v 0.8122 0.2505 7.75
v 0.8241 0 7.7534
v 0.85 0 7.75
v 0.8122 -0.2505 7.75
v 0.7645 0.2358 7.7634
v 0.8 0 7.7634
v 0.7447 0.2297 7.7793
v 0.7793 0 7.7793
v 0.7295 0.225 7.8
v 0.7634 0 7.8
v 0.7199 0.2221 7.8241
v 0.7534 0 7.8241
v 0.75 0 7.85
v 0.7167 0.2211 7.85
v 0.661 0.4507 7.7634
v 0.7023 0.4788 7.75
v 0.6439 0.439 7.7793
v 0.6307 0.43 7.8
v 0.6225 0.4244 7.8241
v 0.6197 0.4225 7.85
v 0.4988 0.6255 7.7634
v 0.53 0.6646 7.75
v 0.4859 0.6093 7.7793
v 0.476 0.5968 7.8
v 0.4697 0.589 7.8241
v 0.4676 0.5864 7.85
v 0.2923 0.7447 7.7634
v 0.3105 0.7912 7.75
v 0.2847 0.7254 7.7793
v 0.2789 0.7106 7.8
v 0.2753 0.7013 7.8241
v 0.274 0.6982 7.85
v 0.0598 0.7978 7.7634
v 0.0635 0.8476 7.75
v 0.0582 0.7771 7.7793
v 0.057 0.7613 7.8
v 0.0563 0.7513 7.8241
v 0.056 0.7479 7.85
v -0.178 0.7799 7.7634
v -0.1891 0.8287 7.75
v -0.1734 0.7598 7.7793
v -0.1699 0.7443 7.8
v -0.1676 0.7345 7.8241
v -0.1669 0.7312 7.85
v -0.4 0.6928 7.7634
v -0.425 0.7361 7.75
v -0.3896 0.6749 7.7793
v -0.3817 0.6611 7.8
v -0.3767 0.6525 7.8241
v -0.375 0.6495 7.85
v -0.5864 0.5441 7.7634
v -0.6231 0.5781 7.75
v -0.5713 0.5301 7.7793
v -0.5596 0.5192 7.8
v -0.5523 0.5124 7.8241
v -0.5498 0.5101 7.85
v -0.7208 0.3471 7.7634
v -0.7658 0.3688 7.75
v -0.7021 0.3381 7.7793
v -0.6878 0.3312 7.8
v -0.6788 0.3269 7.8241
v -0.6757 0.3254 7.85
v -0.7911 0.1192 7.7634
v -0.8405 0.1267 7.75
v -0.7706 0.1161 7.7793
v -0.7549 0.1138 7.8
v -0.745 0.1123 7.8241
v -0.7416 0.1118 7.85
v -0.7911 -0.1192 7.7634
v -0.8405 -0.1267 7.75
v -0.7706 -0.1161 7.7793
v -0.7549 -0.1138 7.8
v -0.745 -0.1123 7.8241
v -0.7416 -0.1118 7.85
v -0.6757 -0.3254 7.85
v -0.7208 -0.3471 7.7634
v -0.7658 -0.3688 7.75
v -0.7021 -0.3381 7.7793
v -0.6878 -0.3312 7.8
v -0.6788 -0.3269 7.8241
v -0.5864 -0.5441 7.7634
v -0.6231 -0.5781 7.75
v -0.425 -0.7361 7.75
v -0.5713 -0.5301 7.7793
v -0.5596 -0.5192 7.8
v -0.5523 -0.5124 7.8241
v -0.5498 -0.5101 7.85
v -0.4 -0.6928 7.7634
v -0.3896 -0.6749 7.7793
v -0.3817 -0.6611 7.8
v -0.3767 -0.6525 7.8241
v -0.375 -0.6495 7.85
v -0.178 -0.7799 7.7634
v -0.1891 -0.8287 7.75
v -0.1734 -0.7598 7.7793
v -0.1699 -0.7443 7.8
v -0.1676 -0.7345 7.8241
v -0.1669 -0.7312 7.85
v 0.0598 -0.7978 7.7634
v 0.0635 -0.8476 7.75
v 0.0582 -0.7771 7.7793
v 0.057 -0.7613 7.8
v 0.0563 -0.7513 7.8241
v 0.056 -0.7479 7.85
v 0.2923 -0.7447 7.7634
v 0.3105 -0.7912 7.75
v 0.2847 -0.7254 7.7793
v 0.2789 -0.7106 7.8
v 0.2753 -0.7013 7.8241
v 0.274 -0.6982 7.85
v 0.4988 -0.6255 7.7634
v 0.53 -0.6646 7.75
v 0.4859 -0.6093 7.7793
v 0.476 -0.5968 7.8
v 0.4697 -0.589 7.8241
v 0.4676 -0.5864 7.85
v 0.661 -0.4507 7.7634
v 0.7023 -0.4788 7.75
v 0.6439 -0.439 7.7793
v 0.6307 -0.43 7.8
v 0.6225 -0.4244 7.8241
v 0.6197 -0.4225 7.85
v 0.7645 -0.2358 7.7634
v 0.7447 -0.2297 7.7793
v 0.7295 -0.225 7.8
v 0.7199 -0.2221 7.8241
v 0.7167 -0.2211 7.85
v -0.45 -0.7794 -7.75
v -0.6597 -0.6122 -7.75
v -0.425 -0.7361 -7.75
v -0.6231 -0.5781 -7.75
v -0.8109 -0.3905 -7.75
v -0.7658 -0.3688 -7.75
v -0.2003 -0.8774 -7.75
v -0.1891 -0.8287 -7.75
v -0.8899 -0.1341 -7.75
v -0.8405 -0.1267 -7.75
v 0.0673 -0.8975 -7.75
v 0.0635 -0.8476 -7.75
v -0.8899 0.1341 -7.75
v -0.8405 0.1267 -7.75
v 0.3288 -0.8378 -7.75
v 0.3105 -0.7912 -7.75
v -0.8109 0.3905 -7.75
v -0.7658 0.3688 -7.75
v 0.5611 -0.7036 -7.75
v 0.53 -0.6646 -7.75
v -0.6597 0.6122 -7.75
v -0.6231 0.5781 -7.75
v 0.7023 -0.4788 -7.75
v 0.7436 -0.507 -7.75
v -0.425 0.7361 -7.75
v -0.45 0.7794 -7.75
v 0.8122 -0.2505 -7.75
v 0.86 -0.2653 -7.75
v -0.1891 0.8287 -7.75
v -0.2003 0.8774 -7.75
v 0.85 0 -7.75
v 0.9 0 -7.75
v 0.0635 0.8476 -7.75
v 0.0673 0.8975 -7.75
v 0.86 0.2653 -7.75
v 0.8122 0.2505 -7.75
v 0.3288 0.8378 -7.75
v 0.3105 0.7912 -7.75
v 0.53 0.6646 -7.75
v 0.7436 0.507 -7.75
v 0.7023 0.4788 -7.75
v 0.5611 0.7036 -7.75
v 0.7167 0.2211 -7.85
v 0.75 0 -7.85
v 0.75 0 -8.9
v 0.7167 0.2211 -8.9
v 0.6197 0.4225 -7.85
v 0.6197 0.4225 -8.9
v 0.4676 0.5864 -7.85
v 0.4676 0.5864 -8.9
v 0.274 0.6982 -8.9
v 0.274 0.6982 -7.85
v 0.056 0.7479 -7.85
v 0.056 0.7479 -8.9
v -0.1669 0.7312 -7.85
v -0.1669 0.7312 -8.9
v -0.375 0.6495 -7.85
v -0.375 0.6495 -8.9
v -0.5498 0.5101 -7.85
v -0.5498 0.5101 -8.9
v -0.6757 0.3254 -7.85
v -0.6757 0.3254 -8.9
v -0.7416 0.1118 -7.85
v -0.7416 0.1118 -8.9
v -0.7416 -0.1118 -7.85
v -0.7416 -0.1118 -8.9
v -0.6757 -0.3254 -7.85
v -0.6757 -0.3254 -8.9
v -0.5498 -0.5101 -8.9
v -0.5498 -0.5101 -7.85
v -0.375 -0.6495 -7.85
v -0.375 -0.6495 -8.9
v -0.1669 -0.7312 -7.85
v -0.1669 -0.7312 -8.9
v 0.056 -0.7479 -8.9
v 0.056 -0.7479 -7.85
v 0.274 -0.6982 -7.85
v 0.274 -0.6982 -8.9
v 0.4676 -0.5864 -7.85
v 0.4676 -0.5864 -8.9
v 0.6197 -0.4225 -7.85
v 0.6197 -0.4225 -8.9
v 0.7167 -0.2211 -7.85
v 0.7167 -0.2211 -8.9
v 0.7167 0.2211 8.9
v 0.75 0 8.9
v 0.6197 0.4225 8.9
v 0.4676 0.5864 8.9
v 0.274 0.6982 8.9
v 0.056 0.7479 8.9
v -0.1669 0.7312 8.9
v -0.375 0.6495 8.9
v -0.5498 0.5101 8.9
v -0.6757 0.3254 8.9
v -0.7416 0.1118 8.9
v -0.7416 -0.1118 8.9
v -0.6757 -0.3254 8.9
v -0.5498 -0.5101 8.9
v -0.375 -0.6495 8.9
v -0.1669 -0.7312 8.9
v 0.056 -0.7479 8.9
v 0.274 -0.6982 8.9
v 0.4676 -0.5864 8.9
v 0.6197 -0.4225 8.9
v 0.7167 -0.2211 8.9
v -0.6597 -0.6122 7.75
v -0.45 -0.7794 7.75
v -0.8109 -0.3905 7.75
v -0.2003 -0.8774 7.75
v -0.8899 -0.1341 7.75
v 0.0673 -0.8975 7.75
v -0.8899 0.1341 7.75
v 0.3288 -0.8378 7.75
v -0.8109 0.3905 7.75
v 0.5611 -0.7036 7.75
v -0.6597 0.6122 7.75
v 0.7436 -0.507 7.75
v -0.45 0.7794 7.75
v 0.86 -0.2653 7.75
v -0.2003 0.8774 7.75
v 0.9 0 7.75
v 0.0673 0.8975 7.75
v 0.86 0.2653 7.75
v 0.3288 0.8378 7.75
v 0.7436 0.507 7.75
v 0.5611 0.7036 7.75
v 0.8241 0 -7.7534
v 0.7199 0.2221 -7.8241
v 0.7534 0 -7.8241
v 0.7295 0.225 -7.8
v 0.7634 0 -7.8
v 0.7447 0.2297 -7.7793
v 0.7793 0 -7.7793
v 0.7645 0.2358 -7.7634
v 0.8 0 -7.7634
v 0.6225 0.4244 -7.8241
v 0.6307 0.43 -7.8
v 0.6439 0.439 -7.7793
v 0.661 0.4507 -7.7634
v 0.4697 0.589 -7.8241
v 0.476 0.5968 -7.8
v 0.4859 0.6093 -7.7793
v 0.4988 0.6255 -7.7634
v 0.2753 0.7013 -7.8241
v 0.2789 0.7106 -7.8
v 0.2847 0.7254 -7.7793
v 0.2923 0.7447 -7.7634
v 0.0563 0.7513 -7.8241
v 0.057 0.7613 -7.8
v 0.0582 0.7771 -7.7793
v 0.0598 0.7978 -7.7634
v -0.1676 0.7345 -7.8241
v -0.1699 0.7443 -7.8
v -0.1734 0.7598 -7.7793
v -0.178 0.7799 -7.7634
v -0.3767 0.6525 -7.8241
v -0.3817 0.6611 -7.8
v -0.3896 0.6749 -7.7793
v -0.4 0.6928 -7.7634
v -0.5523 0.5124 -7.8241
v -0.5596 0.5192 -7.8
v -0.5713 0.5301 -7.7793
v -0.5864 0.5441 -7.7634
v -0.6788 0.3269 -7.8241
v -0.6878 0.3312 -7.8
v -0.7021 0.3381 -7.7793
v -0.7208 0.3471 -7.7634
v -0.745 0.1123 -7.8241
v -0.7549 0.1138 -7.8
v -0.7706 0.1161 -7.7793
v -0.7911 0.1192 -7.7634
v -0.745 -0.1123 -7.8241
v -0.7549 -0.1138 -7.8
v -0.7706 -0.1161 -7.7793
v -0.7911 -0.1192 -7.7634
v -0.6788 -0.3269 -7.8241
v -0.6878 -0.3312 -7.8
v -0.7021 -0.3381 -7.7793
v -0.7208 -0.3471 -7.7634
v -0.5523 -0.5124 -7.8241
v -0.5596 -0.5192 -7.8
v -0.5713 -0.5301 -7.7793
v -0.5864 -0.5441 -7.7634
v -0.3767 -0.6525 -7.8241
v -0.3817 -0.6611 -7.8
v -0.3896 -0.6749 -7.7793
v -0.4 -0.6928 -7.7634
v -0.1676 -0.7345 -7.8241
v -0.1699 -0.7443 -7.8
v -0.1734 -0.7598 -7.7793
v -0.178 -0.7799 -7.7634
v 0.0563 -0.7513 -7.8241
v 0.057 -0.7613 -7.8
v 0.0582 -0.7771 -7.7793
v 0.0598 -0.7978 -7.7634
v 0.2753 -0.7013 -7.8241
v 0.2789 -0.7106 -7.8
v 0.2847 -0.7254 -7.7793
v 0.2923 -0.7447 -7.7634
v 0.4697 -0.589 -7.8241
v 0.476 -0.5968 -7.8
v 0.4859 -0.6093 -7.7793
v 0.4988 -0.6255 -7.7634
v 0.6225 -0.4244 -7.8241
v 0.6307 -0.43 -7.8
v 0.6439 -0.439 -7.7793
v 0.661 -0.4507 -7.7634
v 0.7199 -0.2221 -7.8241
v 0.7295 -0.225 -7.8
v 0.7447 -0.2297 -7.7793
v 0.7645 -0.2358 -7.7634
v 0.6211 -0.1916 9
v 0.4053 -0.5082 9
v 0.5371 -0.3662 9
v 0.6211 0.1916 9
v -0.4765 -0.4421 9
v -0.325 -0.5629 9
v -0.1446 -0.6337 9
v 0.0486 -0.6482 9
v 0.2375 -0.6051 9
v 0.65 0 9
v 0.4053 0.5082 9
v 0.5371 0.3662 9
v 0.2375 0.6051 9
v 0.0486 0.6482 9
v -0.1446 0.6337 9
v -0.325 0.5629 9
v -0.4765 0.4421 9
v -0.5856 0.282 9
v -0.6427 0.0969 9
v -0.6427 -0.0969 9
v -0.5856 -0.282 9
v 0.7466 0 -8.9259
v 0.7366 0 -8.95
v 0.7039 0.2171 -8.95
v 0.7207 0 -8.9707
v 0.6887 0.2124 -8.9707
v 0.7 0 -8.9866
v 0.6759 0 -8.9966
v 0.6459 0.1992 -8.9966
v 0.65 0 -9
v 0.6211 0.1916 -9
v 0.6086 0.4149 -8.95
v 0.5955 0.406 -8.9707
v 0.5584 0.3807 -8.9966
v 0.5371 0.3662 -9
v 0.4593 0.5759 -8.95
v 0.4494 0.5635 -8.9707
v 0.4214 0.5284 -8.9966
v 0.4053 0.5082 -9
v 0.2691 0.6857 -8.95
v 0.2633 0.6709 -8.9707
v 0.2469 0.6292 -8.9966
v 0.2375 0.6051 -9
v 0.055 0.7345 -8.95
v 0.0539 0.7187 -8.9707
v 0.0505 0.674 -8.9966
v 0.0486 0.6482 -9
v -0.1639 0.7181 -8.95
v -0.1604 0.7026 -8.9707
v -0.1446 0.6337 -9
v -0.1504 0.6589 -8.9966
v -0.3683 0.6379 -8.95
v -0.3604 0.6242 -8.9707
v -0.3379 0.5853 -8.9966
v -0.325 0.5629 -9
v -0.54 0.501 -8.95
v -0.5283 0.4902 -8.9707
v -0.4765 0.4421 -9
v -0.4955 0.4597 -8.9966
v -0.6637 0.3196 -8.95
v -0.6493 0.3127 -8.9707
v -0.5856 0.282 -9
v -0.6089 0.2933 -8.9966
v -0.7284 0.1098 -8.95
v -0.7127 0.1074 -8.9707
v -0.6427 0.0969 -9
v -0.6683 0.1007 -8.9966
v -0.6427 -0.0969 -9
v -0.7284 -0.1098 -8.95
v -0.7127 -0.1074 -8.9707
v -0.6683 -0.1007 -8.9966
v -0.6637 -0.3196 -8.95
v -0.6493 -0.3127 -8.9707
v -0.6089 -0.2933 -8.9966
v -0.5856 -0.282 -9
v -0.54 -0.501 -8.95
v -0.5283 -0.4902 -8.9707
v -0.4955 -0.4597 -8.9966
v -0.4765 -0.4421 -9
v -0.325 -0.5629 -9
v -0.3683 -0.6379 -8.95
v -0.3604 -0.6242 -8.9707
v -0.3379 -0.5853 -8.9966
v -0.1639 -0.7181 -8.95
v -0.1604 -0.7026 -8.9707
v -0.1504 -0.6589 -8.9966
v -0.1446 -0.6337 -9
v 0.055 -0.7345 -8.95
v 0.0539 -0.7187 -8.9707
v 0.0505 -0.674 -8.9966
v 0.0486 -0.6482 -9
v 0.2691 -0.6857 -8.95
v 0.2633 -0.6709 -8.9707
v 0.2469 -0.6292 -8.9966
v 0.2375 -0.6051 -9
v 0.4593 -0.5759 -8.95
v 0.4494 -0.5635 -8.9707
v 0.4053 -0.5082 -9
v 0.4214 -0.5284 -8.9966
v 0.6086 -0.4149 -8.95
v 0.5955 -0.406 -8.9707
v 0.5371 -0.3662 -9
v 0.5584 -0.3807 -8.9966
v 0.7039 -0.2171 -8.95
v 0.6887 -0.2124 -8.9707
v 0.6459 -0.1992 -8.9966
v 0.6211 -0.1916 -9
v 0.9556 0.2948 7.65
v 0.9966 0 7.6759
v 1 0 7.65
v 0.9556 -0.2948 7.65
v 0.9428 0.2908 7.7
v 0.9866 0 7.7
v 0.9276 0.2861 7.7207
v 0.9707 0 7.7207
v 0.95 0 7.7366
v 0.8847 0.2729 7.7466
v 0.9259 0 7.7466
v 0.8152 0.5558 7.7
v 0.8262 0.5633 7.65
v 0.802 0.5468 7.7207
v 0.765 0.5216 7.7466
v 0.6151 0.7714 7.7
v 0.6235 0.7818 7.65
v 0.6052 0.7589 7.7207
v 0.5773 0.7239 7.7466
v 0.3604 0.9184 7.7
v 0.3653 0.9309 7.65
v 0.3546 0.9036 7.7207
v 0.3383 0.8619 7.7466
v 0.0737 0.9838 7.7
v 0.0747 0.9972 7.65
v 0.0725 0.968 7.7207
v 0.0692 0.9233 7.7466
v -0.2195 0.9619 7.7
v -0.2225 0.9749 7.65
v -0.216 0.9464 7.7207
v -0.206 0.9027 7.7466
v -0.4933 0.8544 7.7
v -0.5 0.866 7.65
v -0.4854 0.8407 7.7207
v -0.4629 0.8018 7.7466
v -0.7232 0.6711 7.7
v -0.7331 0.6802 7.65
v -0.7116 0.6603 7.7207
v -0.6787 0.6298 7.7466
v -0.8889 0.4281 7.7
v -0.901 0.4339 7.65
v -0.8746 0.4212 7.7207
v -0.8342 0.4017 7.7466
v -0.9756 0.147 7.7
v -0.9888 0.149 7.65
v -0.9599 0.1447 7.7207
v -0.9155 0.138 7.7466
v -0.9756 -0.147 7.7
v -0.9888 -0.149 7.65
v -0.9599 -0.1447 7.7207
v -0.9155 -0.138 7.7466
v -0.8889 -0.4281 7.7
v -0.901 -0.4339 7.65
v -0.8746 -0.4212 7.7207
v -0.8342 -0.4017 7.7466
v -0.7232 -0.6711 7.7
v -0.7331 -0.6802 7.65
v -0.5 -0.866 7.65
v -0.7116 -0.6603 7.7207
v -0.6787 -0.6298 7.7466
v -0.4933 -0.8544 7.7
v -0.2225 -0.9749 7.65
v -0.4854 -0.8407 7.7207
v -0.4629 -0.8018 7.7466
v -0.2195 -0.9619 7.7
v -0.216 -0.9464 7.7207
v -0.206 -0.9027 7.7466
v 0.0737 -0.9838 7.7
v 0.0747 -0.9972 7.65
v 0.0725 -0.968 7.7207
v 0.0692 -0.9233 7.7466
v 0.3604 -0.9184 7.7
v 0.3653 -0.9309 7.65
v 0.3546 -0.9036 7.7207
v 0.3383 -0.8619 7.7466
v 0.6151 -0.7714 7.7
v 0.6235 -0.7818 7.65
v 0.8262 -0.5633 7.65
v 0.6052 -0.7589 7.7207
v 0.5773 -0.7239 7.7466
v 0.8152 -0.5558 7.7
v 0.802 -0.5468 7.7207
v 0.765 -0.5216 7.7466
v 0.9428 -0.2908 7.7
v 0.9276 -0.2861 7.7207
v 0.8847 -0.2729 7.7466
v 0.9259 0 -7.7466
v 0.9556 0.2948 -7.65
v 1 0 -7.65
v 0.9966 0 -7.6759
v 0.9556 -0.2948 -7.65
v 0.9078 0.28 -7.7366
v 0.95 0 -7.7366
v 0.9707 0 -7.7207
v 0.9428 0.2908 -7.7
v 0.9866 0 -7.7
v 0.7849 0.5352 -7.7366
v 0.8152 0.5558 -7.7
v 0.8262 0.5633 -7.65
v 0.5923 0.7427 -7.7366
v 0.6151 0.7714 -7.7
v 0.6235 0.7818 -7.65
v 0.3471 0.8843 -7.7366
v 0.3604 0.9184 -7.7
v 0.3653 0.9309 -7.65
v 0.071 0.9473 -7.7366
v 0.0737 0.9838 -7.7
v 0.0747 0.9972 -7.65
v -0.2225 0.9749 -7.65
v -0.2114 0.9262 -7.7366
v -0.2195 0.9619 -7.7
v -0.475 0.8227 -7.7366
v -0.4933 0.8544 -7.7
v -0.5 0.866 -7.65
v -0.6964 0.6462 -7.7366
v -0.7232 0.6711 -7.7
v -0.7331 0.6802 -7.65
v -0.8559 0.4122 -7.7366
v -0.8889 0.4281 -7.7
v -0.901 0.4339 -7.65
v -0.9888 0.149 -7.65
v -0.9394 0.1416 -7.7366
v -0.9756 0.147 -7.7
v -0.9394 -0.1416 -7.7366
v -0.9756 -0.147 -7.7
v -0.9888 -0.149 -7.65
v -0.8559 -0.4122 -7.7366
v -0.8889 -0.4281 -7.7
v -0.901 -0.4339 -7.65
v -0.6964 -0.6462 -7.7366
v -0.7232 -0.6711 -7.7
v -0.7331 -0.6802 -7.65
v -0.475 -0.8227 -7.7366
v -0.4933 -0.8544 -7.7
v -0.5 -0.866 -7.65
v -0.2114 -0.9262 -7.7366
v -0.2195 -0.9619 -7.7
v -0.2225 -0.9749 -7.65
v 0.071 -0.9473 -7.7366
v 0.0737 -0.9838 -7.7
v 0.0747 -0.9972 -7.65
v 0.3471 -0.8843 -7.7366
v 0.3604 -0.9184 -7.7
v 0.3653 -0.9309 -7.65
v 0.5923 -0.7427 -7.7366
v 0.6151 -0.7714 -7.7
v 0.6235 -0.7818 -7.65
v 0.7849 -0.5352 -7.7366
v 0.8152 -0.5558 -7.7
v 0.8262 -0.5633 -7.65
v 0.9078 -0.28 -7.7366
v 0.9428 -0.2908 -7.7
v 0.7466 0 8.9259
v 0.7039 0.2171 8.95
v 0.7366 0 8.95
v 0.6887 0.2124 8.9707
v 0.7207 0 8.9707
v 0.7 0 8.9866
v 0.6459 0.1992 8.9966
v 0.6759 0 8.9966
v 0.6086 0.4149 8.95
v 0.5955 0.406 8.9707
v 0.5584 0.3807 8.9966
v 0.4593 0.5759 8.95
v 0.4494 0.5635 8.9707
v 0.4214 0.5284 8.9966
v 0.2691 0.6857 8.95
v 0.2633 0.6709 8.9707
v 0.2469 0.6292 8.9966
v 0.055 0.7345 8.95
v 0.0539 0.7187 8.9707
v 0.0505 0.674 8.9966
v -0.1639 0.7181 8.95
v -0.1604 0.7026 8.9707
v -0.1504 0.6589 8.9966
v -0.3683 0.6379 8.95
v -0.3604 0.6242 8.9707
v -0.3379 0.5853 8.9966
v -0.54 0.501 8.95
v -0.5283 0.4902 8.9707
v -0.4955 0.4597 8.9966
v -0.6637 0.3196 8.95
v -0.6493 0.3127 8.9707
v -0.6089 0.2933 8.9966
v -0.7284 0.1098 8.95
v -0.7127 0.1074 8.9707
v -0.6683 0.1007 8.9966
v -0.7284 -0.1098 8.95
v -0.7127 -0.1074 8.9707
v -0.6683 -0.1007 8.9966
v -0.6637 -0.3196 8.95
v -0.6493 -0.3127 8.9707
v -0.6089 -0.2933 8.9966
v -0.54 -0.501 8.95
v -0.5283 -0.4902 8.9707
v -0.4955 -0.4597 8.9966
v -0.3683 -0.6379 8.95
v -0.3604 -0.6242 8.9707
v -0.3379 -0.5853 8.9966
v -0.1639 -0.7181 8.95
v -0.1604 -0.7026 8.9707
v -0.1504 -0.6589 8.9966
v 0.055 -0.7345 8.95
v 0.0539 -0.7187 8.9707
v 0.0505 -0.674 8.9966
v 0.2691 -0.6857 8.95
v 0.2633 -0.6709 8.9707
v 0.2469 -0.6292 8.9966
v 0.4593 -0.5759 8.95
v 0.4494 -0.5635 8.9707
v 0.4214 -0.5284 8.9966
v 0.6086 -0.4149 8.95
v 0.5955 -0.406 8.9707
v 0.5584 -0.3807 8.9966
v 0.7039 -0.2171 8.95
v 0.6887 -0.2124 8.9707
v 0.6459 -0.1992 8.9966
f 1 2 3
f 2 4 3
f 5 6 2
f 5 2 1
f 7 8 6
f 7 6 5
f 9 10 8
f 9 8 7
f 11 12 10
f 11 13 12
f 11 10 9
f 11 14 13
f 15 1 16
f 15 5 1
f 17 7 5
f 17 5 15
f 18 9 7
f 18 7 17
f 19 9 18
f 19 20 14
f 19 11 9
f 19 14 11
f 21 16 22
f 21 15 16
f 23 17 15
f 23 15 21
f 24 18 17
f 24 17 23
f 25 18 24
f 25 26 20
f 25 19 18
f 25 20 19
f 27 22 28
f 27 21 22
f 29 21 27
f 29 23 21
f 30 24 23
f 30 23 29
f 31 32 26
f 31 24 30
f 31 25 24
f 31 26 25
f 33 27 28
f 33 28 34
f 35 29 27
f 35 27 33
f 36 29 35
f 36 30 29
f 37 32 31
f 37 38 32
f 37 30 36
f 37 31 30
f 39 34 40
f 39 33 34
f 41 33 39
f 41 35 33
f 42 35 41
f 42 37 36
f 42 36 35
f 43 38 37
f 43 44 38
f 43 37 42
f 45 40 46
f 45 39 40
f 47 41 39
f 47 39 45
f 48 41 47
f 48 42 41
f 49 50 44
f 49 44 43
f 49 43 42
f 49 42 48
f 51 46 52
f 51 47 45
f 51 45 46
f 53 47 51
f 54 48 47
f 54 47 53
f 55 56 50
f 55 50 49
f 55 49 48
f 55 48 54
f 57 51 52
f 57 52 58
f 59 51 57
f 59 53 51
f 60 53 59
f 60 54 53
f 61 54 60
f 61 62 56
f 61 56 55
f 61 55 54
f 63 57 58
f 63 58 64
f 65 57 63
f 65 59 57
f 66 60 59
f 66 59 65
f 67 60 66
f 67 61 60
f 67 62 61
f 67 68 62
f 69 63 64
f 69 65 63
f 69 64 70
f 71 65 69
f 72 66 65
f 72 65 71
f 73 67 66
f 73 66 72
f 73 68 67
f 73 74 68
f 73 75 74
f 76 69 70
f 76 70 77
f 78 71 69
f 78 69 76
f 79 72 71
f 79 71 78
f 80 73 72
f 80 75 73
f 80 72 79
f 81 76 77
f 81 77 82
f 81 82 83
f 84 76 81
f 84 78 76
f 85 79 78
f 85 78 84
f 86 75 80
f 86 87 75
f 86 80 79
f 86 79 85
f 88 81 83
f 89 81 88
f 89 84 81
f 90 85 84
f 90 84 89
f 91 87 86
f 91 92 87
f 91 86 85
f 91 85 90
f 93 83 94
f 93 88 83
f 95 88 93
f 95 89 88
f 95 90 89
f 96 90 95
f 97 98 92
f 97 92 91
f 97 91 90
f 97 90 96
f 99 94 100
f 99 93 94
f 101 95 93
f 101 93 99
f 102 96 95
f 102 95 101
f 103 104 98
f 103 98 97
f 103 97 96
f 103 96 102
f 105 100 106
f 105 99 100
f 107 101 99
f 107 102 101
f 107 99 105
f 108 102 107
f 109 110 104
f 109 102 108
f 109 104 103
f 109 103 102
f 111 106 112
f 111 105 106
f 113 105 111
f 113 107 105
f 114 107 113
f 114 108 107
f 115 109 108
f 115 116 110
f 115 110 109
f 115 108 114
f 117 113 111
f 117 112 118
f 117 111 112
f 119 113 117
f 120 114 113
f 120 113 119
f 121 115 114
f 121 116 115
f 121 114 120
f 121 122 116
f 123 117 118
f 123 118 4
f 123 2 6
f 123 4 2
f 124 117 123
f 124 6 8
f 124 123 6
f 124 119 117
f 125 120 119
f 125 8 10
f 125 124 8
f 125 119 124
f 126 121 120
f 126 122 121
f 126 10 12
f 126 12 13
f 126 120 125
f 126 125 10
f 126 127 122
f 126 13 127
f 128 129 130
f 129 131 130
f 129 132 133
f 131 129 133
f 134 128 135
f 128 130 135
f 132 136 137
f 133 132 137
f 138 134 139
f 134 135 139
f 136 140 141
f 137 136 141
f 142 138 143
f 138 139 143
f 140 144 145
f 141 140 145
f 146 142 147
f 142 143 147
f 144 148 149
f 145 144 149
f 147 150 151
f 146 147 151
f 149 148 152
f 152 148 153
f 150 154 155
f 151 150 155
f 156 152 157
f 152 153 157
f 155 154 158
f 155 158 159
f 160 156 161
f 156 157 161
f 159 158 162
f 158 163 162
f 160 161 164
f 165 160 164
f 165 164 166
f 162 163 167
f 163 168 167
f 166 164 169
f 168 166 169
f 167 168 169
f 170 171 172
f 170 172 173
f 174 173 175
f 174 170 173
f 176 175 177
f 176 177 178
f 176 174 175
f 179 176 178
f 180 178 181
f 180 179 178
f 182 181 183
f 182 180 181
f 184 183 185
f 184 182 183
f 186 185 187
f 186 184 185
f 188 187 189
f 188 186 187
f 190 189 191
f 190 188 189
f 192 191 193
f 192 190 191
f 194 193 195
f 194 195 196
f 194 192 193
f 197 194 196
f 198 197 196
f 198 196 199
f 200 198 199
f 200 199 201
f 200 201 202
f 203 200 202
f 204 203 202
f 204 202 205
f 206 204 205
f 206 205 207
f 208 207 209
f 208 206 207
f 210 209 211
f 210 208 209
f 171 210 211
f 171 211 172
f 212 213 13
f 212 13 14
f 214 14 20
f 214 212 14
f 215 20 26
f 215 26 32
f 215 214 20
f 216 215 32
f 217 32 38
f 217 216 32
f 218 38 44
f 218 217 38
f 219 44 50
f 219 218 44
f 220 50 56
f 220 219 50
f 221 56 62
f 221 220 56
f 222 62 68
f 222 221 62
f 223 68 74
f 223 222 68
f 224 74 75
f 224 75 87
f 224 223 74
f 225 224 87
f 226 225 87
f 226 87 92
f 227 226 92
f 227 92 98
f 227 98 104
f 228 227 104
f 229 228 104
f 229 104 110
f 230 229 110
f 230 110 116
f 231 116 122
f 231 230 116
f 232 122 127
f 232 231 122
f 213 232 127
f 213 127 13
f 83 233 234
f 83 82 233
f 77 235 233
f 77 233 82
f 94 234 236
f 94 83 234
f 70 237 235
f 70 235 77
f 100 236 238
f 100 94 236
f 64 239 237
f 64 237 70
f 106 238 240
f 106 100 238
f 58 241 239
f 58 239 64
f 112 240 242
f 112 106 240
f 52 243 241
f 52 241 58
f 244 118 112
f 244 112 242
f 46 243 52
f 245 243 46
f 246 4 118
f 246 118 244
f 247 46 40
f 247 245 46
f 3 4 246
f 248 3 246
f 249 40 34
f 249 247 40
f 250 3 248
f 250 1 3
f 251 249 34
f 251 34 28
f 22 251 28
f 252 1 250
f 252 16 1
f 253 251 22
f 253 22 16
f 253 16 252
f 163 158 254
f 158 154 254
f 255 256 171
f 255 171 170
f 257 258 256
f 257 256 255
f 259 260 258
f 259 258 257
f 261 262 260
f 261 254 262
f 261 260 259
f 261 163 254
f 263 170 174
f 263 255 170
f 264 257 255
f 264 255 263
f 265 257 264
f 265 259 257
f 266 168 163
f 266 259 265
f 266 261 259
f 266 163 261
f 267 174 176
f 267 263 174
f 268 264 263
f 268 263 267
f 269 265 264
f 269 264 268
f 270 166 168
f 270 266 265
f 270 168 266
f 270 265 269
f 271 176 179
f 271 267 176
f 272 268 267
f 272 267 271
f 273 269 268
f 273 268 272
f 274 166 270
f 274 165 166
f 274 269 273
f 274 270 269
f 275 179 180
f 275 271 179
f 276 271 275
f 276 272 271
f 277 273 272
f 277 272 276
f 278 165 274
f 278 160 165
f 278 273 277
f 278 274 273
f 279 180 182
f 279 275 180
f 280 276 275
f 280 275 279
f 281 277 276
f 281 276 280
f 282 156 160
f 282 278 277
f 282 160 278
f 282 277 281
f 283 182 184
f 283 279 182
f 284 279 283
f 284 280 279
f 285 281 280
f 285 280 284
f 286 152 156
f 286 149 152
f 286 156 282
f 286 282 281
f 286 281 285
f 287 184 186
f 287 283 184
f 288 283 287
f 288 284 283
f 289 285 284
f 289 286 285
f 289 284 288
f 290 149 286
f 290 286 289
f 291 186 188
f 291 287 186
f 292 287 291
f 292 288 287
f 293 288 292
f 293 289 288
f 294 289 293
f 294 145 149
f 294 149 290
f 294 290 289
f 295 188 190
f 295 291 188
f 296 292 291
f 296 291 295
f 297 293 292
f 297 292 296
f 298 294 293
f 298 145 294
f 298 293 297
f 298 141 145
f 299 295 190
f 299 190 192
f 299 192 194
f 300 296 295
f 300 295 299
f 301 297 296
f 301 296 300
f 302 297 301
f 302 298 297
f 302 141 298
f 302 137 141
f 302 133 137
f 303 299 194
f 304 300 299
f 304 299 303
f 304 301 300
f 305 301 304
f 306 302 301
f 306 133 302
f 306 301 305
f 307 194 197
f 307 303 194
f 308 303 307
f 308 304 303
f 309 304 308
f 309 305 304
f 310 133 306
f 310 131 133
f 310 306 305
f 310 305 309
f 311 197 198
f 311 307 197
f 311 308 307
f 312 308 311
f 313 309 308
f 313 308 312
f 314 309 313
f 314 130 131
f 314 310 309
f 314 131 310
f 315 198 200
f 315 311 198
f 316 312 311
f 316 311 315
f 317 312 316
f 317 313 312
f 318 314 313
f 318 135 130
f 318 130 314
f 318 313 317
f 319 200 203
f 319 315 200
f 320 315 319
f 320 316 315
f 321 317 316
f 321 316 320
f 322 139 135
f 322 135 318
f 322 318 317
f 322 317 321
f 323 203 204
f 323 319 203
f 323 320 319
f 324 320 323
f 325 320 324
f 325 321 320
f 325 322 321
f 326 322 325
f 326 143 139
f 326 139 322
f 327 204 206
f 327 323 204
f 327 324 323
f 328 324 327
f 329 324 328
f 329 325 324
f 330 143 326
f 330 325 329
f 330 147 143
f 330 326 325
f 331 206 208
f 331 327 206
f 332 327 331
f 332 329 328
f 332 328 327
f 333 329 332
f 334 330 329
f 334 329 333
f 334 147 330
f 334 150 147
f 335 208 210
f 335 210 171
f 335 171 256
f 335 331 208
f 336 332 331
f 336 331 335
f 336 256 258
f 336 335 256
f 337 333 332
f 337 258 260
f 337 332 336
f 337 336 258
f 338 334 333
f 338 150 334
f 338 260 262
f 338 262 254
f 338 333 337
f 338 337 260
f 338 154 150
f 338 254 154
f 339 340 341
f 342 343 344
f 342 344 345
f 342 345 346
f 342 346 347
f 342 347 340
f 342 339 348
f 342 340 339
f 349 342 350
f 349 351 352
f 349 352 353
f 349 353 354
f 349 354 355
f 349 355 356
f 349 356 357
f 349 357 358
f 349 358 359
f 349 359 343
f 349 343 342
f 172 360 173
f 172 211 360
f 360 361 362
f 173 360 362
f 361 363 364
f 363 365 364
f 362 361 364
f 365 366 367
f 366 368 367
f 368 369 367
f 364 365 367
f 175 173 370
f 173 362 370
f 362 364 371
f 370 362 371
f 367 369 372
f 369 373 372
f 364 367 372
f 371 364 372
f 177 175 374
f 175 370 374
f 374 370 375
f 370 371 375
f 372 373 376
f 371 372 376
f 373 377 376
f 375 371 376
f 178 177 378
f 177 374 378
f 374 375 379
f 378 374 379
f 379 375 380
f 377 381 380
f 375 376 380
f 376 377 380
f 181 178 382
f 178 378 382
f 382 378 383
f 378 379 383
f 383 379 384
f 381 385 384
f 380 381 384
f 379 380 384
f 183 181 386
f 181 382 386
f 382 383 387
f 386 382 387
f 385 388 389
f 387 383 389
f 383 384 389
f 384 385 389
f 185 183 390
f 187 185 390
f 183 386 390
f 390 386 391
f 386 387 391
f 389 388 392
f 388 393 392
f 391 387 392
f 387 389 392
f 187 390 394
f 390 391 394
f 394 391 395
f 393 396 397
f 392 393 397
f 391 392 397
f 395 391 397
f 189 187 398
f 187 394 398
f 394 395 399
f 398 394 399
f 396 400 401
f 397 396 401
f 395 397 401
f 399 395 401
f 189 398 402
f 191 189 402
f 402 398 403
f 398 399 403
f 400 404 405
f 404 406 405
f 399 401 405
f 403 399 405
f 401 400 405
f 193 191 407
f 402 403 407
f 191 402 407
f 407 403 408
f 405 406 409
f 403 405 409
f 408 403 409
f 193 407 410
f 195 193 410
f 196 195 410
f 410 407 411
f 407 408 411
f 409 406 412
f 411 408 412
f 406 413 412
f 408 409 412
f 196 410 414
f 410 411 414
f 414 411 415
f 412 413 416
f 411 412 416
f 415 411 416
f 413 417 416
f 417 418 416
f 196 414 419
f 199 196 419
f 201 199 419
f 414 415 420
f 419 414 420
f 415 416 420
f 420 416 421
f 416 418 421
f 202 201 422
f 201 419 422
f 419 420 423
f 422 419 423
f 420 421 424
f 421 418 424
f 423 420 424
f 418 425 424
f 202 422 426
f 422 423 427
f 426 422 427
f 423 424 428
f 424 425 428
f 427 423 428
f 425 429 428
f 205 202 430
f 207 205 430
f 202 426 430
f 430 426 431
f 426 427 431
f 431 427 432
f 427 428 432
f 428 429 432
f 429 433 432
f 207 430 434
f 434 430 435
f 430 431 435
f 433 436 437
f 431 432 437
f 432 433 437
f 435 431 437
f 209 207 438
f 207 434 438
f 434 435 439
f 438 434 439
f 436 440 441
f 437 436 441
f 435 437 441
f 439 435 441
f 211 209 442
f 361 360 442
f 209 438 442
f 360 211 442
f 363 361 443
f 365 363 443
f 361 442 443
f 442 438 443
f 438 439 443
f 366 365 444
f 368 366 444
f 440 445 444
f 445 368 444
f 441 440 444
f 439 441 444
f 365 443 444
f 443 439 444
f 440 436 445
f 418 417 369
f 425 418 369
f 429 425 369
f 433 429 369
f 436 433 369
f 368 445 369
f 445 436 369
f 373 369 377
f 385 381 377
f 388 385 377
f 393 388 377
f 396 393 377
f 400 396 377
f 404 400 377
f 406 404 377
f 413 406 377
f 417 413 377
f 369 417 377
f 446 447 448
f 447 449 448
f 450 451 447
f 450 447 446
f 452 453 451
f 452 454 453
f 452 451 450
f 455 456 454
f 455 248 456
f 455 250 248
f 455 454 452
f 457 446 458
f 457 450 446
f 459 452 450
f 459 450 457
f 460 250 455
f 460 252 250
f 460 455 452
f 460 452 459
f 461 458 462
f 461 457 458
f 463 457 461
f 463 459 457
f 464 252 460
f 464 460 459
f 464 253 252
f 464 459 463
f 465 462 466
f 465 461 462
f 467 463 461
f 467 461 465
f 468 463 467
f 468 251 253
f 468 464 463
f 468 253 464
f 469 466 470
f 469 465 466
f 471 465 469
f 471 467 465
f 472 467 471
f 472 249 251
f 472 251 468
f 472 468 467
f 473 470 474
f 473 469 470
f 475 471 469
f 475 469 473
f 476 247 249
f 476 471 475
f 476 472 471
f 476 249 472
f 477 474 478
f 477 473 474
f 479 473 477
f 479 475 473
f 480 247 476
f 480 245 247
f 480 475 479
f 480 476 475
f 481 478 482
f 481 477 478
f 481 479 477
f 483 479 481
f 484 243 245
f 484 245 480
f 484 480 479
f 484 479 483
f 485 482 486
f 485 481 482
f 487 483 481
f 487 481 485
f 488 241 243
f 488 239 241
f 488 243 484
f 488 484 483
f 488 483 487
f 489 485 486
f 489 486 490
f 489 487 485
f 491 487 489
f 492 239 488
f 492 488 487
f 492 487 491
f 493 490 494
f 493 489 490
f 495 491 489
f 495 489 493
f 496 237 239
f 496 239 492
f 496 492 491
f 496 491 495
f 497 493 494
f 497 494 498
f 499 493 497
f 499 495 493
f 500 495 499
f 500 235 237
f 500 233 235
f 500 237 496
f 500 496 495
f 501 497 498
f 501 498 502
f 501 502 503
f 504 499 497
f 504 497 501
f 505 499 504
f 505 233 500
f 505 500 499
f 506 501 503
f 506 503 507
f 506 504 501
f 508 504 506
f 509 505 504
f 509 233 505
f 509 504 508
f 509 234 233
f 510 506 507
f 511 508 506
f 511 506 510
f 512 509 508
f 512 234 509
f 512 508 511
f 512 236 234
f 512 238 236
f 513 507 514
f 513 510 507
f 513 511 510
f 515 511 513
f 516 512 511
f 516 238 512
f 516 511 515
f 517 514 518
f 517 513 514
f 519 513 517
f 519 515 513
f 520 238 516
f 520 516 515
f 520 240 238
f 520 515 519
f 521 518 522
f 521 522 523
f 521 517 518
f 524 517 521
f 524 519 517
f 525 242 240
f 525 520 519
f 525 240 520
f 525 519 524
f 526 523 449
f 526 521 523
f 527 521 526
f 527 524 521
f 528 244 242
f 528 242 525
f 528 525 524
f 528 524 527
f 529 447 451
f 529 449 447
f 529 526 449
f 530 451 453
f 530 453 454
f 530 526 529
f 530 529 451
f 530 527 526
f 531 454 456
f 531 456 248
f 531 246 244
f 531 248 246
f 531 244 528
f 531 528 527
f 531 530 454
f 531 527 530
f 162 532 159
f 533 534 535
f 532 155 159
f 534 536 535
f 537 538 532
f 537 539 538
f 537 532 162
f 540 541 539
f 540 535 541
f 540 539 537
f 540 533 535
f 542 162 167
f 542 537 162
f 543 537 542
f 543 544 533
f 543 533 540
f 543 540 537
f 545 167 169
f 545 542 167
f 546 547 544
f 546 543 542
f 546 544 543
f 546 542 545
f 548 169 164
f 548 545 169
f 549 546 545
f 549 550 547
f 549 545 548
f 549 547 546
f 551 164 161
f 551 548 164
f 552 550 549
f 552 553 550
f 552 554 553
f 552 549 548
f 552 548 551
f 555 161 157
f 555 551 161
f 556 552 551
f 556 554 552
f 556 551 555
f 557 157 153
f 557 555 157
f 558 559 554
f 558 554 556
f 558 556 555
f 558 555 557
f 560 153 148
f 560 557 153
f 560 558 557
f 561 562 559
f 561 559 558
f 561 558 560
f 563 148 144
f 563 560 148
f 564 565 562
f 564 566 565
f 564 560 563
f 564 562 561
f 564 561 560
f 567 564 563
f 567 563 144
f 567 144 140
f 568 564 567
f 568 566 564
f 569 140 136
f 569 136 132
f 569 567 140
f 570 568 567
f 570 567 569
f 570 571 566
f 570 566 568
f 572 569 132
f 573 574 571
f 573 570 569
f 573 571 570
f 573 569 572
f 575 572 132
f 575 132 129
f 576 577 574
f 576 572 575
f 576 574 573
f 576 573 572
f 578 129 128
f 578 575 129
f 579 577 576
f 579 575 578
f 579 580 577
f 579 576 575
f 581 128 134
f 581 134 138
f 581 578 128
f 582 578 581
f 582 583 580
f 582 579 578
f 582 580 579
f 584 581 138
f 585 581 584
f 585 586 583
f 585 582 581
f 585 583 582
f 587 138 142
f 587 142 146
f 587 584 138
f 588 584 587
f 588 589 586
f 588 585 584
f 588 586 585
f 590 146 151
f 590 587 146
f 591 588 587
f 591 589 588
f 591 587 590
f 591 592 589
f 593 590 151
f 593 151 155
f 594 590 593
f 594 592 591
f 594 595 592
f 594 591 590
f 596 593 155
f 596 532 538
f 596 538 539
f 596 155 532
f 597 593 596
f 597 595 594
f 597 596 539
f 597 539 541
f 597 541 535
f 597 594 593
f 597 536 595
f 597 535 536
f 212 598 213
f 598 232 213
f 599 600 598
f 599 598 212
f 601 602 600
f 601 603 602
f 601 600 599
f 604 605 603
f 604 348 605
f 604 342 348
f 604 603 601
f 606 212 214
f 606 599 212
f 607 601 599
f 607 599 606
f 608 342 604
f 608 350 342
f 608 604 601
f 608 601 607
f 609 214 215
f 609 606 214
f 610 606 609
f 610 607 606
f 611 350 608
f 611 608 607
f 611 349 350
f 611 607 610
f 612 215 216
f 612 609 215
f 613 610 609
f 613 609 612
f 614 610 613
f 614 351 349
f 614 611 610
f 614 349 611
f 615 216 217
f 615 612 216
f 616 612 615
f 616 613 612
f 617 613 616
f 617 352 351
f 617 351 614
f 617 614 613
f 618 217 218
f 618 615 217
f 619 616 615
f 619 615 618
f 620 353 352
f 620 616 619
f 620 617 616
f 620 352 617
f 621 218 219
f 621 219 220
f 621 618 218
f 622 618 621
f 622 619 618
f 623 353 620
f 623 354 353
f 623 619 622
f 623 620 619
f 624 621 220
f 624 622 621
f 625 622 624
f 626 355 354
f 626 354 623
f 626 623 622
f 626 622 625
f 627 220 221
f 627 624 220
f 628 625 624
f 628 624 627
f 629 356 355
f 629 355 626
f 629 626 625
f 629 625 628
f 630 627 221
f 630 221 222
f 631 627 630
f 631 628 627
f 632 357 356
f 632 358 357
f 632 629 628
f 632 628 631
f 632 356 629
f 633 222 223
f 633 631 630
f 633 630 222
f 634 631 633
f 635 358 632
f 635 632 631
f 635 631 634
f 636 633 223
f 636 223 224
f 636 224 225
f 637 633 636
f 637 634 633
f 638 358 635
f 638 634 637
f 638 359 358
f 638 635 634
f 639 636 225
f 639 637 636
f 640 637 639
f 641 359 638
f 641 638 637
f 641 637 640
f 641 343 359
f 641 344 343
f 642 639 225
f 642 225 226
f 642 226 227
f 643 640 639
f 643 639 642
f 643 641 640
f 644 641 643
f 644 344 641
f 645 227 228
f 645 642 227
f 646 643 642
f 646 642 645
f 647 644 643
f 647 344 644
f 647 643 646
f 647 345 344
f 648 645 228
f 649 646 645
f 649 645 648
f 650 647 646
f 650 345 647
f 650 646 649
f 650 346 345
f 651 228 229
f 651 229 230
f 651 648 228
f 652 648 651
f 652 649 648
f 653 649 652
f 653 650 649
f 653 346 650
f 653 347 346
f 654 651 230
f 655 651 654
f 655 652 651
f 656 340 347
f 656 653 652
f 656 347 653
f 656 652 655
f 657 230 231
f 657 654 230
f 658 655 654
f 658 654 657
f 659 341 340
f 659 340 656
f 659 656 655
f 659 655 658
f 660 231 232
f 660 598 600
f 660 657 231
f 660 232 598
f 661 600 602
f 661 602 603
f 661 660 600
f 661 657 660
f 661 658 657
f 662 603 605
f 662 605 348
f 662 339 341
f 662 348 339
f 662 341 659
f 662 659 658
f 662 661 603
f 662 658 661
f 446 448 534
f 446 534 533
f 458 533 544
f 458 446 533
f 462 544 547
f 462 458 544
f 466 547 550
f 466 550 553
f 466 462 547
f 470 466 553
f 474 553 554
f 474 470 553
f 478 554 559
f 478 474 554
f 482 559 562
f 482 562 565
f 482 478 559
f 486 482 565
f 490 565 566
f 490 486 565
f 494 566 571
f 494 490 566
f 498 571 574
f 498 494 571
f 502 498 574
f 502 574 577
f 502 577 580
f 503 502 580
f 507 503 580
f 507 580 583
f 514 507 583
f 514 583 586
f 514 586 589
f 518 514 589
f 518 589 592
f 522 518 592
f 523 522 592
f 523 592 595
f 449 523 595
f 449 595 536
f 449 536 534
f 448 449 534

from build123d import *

# Parameters (mm, degrees)
SKETCH1_R           = 1
BOSS_EXTRUDE1_DEPTH = 7.75
SKETCH2_R           = 0.75
BOSS_EXTRUDE2_DEPTH = 9
FILLET1_R           = 0.1


with BuildPart() as part:
    # Sketch1 → Boss-Extrude1 (new, symmetric)
    with BuildSketch(Plane.XY):
        Circle(SKETCH1_R)
    extrude(amount=BOSS_EXTRUDE1_DEPTH, both=True)

    # Sketch2 → Boss-Extrude2 (add, symmetric)
    with BuildSketch(Plane.XY):
        Circle(SKETCH2_R)
    extrude(amount=BOSS_EXTRUDE2_DEPTH, both=True)

    # Fillet1
    fillet1_edges = [part.edges().sort_by_distance(p)[0] for p in [
        (-1, 0, -7.75),
        (-1, 0, 7.75),
        (-0.75, 0, -7.75),
        (-0.75, 0, 7.75),
        (-0.75, 0, -9),
        (-0.75, 0, 9),
    ]]
    fillet(fillet1_edges, radius=FILLET1_R)


solid = part.part
